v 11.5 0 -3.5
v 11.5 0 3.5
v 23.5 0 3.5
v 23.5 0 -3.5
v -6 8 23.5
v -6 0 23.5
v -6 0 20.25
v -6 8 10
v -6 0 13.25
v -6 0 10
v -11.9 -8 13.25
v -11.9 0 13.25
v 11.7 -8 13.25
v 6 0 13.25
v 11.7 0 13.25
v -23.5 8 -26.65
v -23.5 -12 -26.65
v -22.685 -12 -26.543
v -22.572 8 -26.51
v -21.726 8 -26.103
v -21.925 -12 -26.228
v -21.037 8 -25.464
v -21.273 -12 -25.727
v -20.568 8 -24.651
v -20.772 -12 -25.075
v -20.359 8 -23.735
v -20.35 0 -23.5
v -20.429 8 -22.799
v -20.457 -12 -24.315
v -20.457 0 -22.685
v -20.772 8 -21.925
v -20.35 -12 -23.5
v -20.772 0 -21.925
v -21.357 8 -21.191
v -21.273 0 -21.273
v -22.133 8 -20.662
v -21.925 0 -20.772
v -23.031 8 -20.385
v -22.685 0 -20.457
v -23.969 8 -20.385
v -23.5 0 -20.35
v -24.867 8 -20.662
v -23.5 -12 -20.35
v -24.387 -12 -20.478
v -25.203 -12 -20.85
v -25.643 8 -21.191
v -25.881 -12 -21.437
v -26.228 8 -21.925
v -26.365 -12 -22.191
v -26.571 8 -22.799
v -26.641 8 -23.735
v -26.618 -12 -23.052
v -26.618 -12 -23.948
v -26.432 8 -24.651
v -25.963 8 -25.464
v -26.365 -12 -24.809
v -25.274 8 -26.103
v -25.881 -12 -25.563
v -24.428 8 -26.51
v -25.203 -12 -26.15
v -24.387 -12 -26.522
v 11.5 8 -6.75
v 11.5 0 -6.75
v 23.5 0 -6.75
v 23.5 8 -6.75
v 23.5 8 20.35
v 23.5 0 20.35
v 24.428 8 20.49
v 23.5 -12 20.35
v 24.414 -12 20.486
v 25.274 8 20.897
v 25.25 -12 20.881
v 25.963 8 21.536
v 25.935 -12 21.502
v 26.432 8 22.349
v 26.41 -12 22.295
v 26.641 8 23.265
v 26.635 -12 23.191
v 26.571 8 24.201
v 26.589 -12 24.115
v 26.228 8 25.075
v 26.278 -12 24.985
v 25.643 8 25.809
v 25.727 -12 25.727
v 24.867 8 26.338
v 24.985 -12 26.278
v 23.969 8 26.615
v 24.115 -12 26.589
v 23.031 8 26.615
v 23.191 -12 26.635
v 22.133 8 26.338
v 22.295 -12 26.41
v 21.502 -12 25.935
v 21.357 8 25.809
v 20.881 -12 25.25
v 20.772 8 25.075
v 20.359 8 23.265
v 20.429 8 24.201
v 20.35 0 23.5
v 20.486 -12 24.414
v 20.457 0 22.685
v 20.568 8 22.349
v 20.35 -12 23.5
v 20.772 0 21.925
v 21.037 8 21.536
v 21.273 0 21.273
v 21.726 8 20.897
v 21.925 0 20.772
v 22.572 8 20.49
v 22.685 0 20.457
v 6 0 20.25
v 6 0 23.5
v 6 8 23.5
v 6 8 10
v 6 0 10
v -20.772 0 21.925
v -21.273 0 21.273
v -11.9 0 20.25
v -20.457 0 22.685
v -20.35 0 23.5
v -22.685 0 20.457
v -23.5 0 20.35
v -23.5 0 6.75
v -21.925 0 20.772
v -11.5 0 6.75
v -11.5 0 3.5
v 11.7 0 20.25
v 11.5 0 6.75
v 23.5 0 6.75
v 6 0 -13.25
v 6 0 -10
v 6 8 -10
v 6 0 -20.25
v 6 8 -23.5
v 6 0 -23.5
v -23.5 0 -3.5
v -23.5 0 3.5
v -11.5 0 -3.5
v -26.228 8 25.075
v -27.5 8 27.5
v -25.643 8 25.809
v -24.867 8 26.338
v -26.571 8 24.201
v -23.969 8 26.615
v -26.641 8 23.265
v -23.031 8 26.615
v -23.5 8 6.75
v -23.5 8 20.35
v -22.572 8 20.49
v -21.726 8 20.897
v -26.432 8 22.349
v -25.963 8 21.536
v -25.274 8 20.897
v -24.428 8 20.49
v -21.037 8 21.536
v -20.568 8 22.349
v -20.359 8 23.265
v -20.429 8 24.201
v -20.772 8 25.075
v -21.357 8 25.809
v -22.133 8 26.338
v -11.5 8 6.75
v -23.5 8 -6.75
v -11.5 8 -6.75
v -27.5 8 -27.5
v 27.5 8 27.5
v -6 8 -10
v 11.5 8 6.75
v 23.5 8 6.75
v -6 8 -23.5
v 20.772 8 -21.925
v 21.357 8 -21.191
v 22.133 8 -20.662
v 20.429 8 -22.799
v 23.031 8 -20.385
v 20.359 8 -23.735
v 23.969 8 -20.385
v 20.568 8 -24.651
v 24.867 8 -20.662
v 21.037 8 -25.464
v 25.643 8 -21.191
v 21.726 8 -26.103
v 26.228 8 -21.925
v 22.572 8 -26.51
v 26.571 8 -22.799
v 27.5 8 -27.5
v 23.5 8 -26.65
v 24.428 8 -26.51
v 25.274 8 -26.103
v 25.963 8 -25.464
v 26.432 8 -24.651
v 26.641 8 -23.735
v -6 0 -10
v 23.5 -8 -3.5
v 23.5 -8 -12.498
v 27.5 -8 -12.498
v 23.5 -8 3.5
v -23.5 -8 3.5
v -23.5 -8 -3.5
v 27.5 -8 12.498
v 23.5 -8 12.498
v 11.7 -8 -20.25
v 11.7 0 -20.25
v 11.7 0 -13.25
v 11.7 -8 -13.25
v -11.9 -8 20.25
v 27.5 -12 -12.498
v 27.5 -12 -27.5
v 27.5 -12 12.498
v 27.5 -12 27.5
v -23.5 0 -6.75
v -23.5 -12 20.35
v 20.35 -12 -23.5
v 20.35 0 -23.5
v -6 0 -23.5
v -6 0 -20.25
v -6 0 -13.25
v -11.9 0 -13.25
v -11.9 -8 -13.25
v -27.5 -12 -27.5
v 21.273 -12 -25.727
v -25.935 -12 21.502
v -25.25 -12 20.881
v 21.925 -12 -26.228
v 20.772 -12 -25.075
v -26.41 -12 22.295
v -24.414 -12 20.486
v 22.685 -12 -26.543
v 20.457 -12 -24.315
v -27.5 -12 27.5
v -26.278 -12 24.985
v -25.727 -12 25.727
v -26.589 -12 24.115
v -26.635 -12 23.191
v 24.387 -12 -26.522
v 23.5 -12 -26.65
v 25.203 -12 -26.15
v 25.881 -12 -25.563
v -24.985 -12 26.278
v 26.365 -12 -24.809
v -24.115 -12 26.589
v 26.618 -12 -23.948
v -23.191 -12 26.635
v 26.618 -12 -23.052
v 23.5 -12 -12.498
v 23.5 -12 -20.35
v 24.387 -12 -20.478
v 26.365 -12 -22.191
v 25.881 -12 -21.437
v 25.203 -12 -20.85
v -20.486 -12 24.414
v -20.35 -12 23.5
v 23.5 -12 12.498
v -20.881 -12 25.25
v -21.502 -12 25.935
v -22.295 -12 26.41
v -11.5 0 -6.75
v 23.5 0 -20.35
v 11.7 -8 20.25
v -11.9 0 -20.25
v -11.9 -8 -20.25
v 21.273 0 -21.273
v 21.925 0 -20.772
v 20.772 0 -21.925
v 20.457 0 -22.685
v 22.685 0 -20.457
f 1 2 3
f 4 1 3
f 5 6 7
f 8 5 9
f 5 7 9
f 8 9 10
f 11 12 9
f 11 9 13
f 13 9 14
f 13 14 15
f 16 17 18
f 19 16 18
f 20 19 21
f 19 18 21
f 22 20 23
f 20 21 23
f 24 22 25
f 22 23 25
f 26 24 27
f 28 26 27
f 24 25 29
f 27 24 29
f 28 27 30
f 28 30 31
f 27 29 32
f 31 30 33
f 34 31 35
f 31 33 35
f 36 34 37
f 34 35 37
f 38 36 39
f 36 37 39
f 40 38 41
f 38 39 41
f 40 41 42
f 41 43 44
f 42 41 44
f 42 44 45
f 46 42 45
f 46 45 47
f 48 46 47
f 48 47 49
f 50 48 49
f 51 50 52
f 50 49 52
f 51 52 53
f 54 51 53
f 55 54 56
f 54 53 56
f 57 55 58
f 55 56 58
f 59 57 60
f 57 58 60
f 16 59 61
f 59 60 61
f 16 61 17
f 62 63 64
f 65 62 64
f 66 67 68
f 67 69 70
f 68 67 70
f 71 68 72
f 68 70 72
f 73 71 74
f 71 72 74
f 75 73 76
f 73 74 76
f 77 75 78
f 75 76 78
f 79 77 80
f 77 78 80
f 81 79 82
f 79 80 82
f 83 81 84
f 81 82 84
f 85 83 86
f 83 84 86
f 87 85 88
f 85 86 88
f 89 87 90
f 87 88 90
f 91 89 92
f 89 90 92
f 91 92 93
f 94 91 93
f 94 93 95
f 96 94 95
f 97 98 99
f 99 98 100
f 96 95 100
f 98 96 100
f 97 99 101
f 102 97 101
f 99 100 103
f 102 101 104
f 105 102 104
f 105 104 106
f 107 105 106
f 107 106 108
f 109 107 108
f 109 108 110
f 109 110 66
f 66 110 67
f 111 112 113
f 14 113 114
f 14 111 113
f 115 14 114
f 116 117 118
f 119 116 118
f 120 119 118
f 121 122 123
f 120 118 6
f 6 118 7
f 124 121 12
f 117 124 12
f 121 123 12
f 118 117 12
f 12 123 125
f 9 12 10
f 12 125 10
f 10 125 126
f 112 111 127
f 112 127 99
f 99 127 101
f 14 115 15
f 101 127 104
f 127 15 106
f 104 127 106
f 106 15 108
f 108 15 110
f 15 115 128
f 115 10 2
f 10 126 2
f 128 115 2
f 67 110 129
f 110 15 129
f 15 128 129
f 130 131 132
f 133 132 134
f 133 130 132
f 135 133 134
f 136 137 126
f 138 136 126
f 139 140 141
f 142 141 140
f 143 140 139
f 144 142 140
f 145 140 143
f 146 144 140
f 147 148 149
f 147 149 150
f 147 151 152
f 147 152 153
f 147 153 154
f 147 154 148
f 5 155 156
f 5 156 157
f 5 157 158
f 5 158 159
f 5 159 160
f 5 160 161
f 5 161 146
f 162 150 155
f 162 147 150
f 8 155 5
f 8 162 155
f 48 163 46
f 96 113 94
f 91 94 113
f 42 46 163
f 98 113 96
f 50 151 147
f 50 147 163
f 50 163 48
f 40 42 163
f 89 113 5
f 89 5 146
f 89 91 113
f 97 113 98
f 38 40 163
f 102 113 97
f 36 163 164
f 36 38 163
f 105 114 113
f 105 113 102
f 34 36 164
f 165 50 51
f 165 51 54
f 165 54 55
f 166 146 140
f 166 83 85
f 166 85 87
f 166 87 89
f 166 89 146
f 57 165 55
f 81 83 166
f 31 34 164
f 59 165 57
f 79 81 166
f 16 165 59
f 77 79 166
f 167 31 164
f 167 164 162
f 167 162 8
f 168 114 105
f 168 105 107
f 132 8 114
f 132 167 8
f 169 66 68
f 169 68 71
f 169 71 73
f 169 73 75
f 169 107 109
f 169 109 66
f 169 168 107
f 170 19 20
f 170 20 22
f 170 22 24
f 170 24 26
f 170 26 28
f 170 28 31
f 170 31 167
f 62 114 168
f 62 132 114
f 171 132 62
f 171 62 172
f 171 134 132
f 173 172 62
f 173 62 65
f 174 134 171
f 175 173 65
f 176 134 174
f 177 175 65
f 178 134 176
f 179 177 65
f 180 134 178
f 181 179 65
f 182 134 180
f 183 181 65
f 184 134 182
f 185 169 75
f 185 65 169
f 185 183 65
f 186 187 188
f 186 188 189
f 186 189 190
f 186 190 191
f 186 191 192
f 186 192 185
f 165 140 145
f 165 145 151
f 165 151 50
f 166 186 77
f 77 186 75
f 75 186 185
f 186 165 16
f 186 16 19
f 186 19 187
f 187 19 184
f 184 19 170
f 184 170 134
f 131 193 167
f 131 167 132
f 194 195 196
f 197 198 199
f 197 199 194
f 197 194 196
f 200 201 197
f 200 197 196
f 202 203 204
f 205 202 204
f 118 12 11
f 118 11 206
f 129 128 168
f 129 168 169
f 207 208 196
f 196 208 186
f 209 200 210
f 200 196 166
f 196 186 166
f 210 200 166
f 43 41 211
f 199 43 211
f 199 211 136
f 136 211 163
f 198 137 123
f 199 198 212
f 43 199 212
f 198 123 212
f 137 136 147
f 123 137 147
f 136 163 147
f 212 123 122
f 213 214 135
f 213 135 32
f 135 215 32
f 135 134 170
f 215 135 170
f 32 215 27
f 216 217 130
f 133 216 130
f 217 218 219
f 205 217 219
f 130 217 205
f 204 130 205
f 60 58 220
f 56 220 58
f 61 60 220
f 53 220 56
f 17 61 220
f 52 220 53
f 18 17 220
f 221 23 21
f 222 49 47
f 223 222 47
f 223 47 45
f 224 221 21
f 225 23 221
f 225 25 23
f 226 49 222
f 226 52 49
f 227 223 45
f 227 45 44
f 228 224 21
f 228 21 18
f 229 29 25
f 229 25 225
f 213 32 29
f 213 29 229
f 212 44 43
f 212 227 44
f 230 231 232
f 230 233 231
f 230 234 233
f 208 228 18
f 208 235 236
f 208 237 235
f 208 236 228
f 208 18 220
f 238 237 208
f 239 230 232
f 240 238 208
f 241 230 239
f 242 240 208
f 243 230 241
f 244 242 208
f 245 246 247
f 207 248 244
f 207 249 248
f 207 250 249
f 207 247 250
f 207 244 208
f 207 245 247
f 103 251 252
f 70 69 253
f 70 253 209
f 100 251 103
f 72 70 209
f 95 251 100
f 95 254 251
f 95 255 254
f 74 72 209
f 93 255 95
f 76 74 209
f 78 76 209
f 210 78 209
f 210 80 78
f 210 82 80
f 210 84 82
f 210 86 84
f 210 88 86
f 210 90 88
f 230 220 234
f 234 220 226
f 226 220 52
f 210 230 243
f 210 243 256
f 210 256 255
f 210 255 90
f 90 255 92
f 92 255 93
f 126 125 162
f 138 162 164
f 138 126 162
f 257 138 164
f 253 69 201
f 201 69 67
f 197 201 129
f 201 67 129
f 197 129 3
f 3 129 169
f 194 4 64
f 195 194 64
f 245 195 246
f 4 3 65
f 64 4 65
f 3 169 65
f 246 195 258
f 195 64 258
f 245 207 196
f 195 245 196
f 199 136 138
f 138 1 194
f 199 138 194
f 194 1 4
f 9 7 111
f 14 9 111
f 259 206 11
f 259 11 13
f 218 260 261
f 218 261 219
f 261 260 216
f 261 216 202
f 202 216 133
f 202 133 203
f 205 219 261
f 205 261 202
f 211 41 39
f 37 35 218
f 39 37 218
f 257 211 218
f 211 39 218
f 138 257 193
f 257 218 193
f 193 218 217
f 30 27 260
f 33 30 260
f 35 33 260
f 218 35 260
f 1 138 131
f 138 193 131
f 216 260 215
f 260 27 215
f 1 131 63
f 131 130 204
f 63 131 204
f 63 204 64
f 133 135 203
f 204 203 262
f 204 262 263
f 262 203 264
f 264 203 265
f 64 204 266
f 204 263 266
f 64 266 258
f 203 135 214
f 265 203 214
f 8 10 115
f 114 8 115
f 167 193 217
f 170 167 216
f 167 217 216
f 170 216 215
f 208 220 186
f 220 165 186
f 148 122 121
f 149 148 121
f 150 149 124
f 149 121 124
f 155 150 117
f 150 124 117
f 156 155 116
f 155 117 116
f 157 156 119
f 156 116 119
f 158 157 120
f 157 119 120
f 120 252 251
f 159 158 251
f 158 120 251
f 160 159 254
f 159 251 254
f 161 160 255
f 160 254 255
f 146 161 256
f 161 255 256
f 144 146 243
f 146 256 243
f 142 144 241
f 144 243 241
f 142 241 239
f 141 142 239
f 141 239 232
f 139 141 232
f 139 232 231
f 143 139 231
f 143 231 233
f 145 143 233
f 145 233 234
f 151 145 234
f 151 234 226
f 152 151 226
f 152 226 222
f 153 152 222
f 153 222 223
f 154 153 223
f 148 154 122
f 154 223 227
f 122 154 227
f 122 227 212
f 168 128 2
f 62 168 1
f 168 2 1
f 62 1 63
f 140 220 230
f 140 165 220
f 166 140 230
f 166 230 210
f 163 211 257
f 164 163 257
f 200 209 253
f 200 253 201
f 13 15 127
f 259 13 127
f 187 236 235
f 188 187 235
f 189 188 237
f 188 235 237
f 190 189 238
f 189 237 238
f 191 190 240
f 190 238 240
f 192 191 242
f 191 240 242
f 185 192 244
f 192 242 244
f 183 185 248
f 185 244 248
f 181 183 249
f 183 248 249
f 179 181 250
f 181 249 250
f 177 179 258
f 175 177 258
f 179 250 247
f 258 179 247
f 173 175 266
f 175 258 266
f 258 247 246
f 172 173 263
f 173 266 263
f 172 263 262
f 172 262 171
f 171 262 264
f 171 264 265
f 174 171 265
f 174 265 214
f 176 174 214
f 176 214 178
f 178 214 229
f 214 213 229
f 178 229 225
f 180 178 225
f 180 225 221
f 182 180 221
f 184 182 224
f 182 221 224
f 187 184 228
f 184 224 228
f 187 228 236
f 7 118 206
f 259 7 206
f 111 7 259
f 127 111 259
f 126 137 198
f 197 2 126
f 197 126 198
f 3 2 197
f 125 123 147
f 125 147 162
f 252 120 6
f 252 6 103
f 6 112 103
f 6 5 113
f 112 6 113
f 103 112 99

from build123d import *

# Parameters (mm, degrees)
SKETCH1_W           = 55
SKETCH1_H           = 55
SKETCH1_W_2         = 12
SKETCH1_H_2         = 13.5
BOSS_EXTRUDE1_DEPTH = 8
SKETCH2_W           = 55
SKETCH2_H           = 55
BOSS_EXTRUDE7_DEPTH = 12
SKETCH2_5_W         = 23.6
SKETCH2_5_H         = 7
SKETCH2_5_W_2       = 47
BOSS_EXTRUDE8_DEPTH = 8
SKETCH6_R           = 3.15
CUT_EXTRUDE1_DEPTH  = 44.732139211
SKETCH7_W           = 24.995653022
SKETCH7_H           = 4
CUT_EXTRUDE3_DEPTH  = 4


with BuildPart() as part:
    # Sketch1 → Boss-Extrude1 (new body)
    with BuildSketch(Plane(origin=(0, 0, 0), x_dir=(1, 0, 0), z_dir=(0, 1, 0))):
        Rectangle(SKETCH1_W, SKETCH1_H)
        with Locations((0, 16.75)):
            Rectangle(SKETCH1_W_2, SKETCH1_H_2, mode=Mode.SUBTRACT)
        with Locations((17.5, 0)):
            Rectangle(SKETCH1_W_2, SKETCH1_H_2, mode=Mode.SUBTRACT)
        with Locations((-17.5, 0)):
            Rectangle(SKETCH1_W_2, SKETCH1_H_2, mode=Mode.SUBTRACT)
        with Locations((0, -16.75)):
            Rectangle(SKETCH1_W_2, SKETCH1_H_2, mode=Mode.SUBTRACT)
    extrude(amount=BOSS_EXTRUDE1_DEPTH)

    # Sketch2 → Boss-Extrude7 (add)
    with BuildSketch(Plane.XZ):
        Rectangle(SKETCH2_W, SKETCH2_H)
        Polygon((-23.5, 23.5), (-6, 23.5), (6, 23.5), (23.5, 23.5), (23.5, 6.75), (23.5, 3.5), (23.5, -3.5), (23.5, -6.75), (23.5, -23.5), (6, -23.5), (-6, -23.5), (-23.5, -23.5), (-23.5, -6.75), (-23.5, -3.5), (-23.5, 3.5), (-23.5, 6.75), align=None, mode=Mode.SUBTRACT)
    extrude(amount=BOSS_EXTRUDE7_DEPTH)

    # Sketch2<5> → Boss-Extrude8 (add)
    with BuildSketch(Plane.XZ):
        with Locations((-0.1, 16.75)):
            Rectangle(SKETCH2_5_W, SKETCH2_5_H)
        Rectangle(SKETCH2_5_W_2, SKETCH2_5_H)
        with Locations((-0.1, -16.75)):
            Rectangle(SKETCH2_5_W, SKETCH2_5_H)
    extrude(amount=BOSS_EXTRUDE8_DEPTH)

    # Sketch6 → Cut-Extrude1 (cut, through all)
    with BuildSketch(Plane.XZ.offset(12)):
        with Locations((-23.5, 23.5)):
            Circle(SKETCH6_R)
        with Locations((23.5, 23.5)):
            Circle(SKETCH6_R)
        with Locations((-23.5, -23.5)):
            Circle(SKETCH6_R)
        with Locations((23.5, -23.5)):
            Circle(SKETCH6_R)
    extrude(amount=-CUT_EXTRUDE1_DEPTH, mode=Mode.SUBTRACT)

    # Sketch7 → Cut-Extrude3 (cut)
    with BuildSketch(Plane(origin=(27.5, 0, 0), x_dir=(0, 0, -1), z_dir=(1, 0, 0))):
        with Locations((0, -10)):
            Rectangle(SKETCH7_W, SKETCH7_H)
    extrude(amount=-CUT_EXTRUDE3_DEPTH, mode=Mode.SUBTRACT)


solid = part.part
